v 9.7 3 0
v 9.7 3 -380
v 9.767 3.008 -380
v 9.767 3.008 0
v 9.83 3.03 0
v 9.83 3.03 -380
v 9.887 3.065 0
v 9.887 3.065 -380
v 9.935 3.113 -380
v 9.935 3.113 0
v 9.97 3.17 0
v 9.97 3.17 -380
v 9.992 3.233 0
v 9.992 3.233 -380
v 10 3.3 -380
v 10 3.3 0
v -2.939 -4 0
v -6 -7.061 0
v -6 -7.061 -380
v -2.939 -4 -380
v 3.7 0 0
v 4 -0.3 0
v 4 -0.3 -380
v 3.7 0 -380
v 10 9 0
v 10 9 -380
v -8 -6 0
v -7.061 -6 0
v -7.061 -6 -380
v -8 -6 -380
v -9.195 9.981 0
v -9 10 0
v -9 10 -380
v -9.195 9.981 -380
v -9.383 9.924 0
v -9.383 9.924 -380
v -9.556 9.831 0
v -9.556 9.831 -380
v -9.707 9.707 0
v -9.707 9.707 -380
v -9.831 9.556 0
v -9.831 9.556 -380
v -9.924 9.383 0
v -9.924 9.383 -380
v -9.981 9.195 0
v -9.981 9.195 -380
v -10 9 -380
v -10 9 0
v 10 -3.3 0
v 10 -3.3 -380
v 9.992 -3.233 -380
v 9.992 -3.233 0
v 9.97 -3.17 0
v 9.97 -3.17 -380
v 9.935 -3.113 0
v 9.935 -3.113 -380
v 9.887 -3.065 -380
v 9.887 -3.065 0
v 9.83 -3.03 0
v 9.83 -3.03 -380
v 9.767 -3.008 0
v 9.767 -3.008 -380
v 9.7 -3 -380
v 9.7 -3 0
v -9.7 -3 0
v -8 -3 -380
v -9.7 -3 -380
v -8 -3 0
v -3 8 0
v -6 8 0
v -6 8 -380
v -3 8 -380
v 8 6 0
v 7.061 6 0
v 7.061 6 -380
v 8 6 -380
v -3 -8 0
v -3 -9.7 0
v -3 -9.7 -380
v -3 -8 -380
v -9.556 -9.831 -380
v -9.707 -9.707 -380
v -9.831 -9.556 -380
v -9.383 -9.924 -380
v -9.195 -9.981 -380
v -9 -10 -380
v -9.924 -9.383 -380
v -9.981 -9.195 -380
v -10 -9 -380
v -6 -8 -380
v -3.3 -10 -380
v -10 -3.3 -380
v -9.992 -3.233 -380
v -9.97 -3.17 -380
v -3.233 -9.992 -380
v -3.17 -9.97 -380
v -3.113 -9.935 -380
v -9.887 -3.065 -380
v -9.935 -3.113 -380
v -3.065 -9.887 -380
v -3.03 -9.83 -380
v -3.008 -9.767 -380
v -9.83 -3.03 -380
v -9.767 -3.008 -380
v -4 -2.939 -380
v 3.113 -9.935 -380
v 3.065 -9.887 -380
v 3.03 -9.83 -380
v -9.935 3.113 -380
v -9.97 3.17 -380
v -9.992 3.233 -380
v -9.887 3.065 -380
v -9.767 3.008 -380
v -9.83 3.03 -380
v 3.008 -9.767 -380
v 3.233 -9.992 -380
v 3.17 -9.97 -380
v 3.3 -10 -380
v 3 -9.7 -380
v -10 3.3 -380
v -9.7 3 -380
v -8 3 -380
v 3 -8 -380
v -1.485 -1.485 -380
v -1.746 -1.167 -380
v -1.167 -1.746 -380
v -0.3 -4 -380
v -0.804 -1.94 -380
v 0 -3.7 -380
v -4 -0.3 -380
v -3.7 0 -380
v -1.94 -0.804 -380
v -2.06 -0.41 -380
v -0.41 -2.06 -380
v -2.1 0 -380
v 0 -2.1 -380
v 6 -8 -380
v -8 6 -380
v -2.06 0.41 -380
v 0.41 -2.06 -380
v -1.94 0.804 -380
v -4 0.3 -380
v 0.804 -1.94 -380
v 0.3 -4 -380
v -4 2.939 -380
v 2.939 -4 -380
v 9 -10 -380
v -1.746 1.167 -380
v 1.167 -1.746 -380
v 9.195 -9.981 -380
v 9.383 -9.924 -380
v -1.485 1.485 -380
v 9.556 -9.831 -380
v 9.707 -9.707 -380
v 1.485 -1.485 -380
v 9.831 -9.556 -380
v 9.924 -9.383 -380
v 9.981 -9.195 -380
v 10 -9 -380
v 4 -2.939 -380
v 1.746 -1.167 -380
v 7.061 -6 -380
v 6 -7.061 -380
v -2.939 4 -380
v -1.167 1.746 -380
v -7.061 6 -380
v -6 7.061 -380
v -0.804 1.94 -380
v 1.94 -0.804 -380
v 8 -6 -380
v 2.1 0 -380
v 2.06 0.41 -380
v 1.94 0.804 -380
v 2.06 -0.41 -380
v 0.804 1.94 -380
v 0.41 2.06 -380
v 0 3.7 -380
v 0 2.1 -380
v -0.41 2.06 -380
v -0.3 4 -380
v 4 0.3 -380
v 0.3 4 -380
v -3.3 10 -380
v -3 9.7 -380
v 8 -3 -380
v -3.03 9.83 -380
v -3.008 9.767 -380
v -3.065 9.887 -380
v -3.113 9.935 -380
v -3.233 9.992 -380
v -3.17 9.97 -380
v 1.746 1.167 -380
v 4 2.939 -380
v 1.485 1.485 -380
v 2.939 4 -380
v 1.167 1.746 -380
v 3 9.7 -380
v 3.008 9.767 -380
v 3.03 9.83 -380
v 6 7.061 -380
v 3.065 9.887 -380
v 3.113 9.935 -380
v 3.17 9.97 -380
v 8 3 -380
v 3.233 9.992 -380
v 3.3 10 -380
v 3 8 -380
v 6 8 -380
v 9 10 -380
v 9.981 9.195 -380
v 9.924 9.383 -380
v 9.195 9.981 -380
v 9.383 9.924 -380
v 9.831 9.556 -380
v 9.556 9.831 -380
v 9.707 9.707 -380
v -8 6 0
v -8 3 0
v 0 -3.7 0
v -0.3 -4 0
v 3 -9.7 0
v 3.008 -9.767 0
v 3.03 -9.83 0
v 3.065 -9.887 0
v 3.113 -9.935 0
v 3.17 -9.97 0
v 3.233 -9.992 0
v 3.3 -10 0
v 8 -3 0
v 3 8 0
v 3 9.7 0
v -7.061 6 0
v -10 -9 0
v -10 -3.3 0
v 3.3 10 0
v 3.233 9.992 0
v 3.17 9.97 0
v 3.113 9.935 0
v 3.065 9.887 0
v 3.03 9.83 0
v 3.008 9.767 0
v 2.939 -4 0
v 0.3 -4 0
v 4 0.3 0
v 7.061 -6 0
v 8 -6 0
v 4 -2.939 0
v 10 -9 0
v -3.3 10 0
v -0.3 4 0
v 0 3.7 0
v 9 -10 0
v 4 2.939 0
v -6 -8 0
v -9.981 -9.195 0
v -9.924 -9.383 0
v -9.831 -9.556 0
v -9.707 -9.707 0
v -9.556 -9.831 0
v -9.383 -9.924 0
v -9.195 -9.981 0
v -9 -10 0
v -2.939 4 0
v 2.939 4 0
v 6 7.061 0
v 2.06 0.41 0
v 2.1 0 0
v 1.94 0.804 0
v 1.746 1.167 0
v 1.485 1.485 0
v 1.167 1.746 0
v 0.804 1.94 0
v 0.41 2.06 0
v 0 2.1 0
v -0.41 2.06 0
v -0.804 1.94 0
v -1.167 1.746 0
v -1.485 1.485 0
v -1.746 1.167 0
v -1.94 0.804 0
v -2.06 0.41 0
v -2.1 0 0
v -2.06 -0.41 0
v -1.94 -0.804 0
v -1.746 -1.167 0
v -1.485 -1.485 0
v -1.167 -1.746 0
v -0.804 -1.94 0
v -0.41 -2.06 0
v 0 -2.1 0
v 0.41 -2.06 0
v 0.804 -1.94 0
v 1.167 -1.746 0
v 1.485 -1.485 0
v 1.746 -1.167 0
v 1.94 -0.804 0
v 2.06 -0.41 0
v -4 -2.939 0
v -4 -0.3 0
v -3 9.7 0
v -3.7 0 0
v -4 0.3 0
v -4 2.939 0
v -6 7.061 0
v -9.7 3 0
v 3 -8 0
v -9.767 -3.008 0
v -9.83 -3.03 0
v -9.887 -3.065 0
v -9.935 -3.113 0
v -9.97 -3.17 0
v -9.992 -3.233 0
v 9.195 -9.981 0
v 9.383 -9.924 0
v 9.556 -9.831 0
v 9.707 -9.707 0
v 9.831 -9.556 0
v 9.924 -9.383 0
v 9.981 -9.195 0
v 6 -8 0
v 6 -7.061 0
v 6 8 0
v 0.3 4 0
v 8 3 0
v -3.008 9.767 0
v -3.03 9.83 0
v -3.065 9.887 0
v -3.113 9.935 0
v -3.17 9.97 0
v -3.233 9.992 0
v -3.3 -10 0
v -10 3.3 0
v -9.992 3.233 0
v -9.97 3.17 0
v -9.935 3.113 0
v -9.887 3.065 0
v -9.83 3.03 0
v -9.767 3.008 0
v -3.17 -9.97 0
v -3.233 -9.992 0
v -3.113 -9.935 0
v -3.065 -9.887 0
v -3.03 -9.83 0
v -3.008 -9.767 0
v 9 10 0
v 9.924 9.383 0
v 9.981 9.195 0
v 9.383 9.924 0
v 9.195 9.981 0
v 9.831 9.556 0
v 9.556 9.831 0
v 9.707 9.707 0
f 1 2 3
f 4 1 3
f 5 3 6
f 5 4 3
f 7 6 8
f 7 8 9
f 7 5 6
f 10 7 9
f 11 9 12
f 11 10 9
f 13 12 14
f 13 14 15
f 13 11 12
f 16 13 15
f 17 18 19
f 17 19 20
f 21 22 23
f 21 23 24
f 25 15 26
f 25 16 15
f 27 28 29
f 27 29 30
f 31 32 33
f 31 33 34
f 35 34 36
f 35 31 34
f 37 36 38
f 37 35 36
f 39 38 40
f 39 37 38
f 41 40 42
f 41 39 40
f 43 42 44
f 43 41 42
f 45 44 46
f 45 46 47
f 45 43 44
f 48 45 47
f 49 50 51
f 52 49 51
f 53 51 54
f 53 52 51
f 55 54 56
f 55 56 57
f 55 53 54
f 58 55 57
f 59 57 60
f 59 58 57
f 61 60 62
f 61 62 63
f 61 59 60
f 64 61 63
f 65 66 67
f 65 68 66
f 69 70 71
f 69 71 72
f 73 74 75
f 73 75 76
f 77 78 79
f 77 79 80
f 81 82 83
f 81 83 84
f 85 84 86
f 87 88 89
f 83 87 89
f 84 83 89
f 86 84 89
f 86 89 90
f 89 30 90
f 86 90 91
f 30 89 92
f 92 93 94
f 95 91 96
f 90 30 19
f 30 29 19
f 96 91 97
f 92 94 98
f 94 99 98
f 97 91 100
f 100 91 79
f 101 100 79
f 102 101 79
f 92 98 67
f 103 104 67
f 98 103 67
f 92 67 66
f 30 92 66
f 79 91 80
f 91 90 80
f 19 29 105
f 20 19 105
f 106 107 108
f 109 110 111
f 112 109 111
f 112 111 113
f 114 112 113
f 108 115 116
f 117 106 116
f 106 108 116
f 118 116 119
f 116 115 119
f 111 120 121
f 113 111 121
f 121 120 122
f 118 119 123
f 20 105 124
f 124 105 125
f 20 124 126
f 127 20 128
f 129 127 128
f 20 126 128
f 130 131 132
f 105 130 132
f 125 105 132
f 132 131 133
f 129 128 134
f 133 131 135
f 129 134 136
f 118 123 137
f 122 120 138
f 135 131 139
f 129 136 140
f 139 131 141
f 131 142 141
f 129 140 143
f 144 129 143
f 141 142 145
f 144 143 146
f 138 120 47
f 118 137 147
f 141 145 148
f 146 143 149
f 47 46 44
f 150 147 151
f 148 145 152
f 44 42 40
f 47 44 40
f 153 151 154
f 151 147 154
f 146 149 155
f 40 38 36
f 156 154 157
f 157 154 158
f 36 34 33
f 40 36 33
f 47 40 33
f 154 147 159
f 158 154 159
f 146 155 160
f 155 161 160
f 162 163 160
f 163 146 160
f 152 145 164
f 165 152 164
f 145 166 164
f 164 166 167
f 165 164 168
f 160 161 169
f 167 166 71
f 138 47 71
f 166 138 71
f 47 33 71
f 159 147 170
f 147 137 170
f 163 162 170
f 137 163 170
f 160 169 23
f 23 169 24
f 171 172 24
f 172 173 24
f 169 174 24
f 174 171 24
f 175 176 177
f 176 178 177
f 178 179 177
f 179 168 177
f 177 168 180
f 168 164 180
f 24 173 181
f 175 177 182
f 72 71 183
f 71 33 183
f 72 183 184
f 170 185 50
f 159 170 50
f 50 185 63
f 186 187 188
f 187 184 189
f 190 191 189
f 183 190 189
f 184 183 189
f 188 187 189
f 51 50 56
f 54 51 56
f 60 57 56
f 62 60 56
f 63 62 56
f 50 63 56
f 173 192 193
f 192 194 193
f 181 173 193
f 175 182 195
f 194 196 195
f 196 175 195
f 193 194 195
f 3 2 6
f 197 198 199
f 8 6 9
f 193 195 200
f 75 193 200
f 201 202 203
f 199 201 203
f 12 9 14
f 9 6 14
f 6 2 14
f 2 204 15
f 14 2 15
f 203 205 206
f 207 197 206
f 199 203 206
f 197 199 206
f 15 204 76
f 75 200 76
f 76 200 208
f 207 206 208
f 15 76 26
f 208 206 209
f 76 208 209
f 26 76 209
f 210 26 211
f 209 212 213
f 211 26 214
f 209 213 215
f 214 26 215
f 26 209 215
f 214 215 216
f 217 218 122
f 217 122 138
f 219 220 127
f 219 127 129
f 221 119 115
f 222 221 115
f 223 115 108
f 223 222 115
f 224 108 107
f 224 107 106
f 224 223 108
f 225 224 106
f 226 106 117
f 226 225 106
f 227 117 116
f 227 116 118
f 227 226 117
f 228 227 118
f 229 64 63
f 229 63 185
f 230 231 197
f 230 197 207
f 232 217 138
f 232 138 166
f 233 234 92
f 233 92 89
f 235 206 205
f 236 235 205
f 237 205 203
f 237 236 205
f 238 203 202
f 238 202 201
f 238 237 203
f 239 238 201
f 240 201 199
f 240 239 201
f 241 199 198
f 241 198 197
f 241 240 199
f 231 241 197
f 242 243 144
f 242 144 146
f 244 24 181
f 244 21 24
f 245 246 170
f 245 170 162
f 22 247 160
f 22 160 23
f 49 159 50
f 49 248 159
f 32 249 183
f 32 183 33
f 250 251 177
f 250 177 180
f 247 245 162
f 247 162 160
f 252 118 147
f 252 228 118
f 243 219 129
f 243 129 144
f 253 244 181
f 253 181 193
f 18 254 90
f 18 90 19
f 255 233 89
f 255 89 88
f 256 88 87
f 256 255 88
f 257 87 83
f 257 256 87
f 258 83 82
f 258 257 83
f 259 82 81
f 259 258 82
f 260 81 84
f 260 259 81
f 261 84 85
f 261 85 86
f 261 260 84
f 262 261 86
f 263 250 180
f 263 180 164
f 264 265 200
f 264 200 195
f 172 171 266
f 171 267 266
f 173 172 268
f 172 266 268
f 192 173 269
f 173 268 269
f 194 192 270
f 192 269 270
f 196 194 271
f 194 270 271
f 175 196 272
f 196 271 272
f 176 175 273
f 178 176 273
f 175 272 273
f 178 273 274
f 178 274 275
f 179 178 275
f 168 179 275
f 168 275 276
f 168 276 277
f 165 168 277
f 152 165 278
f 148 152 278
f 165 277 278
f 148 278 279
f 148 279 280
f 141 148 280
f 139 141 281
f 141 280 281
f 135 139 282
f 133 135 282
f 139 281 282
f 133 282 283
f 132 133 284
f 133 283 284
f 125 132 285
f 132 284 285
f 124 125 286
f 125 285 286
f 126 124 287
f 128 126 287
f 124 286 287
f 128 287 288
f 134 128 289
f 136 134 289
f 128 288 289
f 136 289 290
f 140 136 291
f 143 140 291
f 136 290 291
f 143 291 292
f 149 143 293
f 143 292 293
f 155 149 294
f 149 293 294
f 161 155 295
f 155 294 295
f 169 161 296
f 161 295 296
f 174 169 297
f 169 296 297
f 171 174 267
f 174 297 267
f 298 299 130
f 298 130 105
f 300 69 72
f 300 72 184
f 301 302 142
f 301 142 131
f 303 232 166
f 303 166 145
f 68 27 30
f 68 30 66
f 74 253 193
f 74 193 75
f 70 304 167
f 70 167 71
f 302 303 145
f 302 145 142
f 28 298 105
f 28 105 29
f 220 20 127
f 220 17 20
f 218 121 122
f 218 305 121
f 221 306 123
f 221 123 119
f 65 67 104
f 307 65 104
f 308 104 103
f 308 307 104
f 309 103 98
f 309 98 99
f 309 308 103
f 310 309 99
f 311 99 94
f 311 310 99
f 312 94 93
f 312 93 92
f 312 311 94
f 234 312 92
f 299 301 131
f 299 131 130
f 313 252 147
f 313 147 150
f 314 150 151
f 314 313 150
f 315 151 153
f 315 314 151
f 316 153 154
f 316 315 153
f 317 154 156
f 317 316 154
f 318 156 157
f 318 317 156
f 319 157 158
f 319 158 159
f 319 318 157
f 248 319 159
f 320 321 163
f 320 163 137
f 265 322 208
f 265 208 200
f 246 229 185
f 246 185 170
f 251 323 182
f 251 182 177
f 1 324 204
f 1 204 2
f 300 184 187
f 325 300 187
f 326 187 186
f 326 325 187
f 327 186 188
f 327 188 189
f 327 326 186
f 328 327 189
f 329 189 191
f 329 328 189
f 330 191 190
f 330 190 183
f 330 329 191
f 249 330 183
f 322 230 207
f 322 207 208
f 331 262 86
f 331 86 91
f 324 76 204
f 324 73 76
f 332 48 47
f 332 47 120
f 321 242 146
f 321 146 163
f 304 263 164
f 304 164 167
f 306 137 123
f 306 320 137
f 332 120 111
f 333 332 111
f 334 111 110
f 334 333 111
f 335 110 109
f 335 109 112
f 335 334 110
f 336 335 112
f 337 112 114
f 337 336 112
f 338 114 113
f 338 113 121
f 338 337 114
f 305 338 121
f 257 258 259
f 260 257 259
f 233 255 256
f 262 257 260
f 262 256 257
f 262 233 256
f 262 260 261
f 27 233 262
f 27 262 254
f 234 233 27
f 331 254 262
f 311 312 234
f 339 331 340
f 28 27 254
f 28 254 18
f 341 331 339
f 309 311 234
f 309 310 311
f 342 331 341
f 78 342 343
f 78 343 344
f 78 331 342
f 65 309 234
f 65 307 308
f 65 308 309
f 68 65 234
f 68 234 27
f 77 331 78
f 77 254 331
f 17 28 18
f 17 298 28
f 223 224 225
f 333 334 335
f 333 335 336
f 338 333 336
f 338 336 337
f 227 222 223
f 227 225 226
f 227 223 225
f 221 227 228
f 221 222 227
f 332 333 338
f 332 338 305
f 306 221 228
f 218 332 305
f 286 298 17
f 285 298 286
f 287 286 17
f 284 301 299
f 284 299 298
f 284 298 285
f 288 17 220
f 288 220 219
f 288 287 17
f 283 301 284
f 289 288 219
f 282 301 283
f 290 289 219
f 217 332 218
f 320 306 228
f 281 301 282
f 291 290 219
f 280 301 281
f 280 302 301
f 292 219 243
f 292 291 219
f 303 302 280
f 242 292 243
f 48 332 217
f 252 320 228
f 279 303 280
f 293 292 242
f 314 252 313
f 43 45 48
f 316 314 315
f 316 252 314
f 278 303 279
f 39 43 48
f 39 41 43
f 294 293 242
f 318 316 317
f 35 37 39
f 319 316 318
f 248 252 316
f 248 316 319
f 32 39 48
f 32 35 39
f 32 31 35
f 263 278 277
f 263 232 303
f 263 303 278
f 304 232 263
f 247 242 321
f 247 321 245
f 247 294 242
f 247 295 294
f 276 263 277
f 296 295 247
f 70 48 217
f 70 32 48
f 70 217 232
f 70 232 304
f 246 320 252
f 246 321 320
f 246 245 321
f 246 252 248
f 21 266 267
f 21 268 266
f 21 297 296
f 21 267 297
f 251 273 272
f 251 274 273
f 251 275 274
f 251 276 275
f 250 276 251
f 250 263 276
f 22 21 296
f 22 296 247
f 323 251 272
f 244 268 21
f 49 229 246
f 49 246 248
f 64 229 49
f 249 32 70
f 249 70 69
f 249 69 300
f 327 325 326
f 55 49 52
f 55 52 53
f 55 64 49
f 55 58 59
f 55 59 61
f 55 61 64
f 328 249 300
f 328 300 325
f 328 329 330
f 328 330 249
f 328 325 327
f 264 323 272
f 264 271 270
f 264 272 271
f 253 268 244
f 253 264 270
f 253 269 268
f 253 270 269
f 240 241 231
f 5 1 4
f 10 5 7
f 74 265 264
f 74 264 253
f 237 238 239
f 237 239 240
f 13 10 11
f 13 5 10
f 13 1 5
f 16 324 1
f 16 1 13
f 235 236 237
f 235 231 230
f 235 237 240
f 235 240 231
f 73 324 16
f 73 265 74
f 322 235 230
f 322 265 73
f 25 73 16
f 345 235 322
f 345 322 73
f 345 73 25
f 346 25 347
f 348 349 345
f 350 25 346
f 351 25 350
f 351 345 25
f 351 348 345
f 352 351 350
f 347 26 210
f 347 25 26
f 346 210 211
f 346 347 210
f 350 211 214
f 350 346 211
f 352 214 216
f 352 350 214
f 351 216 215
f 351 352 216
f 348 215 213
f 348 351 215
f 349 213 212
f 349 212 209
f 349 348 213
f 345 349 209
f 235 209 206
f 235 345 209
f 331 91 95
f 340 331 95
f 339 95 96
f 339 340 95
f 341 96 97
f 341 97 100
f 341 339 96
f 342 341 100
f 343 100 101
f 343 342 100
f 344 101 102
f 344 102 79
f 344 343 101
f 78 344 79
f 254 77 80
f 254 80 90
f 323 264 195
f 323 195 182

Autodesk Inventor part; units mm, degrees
sketch "Sketch_5" plane through (0, 0, 0) normal (0, 0, 1) x (1, 0, 0)
  arc A0 (-10, 3.3) -> (-9.7, 3) centre (-9.7, 3.3) ccw
  line L0 (-9.7, 3) -> (-8, 3)
  line L1 (-8, 3) -> (-8, 6)
  line L2 (-8, 6) -> (-7.0607, 6)
  line L3 (-7.0607, 6) -> (-4, 2.9393)
  line L4 (-4, 2.9393) -> (-4, 0.3)
  line L5 (-4, 0.3) -> (-3.7, 0)
  line L6 (-3.7, 0) -> (-4, -0.3)
  line L7 (-4, -0.3) -> (-4, -2.9393)
  line L8 (-4, -2.9393) -> (-7.0607, -6)
  line L9 (-7.0607, -6) -> (-8, -6)
  line L10 (-8, -6) -> (-8, -3)
  line L11 (-8, -3) -> (-9.7, -3)
  arc A1 (-9.7, -3) -> (-10, -3.3) centre (-9.7, -3.3) ccw
  line L12 (-10, -3.3) -> (-10, -9)
  arc A2 (-10, -9) -> (-9, -10) centre (-9, -9) ccw
  line L13 (-9, -10) -> (-3.3, -10)
  arc A3 (-3.3, -10) -> (-3, -9.7) centre (-3.3, -9.7) ccw
  line L14 (-3, -9.7) -> (-3, -8)
  line L15 (-3, -8) -> (-6, -8)
  line L16 (-6, -8) -> (-6, -7.0607)
  line L17 (-6, -7.0607) -> (-2.9393, -4)
  line L18 (-2.9393, -4) -> (-0.3, -4)
  line L19 (-0.3, -4) -> (0, -3.7)
  line L20 (0, -3.7) -> (0.3, -4)
  line L21 (0.3, -4) -> (2.9393, -4)
  line L22 (2.9393, -4) -> (6, -7.0607)
  line L23 (6, -7.0607) -> (6, -8)
  line L24 (6, -8) -> (3, -8)
  line L25 (3, -8) -> (3, -9.7)
  arc A4 (3, -9.7) -> (3.3, -10) centre (3.3, -9.7) ccw
  line L26 (3.3, -10) -> (9, -10)
  arc A5 (9, -10) -> (10, -9) centre (9, -9) ccw
  line L27 (10, -9) -> (10, -3.3)
  arc A6 (10, -3.3) -> (9.7, -3) centre (9.7, -3.3) ccw
  line L28 (9.7, -3) -> (8, -3)
  line L29 (8, -3) -> (8, -6)
  line L30 (8, -6) -> (7.0607, -6)
  line L31 (7.0607, -6) -> (4, -2.9393)
  line L32 (4, -2.9393) -> (4, -0.3)
  line L33 (4, -0.3) -> (3.7, 0)
  line L34 (3.7, 0) -> (4, 0.3)
  line L35 (4, 0.3) -> (4, 2.9393)
  line L36 (4, 2.9393) -> (7.0607, 6)
  line L37 (7.0607, 6) -> (8, 6)
  line L38 (8, 6) -> (8, 3)
  line L39 (8, 3) -> (9.7, 3)
  arc A7 (9.7, 3) -> (10, 3.3) centre (9.7, 3.3) ccw
  line L40 (10, 3.3) -> (10, 9)
  arc A8 (10, 9) -> (9, 10) centre (9, 9) ccw
  line L41 (9, 10) -> (3.3, 10)
  arc A9 (3.3, 10) -> (3, 9.7) centre (3.3, 9.7) ccw
  line L42 (3, 9.7) -> (3, 8)
  line L43 (3, 8) -> (6, 8)
  line L44 (6, 8) -> (6, 7.0607)
  line L45 (6, 7.0607) -> (2.9393, 4)
  line L46 (2.9393, 4) -> (0.3, 4)
  line L47 (0.3, 4) -> (0, 3.7)
  line L48 (0, 3.7) -> (-0.3, 4)
  line L49 (-0.3, 4) -> (-2.9393, 4)
  line L50 (-2.9393, 4) -> (-6, 7.0607)
  line L51 (-6, 7.0607) -> (-6, 8)
  line L52 (-6, 8) -> (-3, 8)
  line L53 (-3, 8) -> (-3, 9.7)
  arc A10 (-3, 9.7) -> (-3.3, 10) centre (-3.3, 9.7) ccw
  line L54 (-3.3, 10) -> (-9, 10)
  arc A11 (-9, 10) -> (-10, 9) centre (-9, 9) ccw
  line L55 (-10, 9) -> (-10, 3.3)
  circle A12 centre (0, 0) radius 2.1
extrude "Extrusion1" add sketch "Sketch_5" against normal blind 380
ref_plane "to_frame_XY" through (0, 0, 0) normal (0, 0, 1) x (1, 0, 0)
ref_plane "to_frame_YZ" through (0, 0, 0) normal (1, 0, 0) x (0, 1, 0)
ref_plane "to_frame_ZX" through (0, 0, 0) normal (0, 1, 0) x (0, 0, 1)
properties part number "프로파일_380" material "알루미늄 6061"
